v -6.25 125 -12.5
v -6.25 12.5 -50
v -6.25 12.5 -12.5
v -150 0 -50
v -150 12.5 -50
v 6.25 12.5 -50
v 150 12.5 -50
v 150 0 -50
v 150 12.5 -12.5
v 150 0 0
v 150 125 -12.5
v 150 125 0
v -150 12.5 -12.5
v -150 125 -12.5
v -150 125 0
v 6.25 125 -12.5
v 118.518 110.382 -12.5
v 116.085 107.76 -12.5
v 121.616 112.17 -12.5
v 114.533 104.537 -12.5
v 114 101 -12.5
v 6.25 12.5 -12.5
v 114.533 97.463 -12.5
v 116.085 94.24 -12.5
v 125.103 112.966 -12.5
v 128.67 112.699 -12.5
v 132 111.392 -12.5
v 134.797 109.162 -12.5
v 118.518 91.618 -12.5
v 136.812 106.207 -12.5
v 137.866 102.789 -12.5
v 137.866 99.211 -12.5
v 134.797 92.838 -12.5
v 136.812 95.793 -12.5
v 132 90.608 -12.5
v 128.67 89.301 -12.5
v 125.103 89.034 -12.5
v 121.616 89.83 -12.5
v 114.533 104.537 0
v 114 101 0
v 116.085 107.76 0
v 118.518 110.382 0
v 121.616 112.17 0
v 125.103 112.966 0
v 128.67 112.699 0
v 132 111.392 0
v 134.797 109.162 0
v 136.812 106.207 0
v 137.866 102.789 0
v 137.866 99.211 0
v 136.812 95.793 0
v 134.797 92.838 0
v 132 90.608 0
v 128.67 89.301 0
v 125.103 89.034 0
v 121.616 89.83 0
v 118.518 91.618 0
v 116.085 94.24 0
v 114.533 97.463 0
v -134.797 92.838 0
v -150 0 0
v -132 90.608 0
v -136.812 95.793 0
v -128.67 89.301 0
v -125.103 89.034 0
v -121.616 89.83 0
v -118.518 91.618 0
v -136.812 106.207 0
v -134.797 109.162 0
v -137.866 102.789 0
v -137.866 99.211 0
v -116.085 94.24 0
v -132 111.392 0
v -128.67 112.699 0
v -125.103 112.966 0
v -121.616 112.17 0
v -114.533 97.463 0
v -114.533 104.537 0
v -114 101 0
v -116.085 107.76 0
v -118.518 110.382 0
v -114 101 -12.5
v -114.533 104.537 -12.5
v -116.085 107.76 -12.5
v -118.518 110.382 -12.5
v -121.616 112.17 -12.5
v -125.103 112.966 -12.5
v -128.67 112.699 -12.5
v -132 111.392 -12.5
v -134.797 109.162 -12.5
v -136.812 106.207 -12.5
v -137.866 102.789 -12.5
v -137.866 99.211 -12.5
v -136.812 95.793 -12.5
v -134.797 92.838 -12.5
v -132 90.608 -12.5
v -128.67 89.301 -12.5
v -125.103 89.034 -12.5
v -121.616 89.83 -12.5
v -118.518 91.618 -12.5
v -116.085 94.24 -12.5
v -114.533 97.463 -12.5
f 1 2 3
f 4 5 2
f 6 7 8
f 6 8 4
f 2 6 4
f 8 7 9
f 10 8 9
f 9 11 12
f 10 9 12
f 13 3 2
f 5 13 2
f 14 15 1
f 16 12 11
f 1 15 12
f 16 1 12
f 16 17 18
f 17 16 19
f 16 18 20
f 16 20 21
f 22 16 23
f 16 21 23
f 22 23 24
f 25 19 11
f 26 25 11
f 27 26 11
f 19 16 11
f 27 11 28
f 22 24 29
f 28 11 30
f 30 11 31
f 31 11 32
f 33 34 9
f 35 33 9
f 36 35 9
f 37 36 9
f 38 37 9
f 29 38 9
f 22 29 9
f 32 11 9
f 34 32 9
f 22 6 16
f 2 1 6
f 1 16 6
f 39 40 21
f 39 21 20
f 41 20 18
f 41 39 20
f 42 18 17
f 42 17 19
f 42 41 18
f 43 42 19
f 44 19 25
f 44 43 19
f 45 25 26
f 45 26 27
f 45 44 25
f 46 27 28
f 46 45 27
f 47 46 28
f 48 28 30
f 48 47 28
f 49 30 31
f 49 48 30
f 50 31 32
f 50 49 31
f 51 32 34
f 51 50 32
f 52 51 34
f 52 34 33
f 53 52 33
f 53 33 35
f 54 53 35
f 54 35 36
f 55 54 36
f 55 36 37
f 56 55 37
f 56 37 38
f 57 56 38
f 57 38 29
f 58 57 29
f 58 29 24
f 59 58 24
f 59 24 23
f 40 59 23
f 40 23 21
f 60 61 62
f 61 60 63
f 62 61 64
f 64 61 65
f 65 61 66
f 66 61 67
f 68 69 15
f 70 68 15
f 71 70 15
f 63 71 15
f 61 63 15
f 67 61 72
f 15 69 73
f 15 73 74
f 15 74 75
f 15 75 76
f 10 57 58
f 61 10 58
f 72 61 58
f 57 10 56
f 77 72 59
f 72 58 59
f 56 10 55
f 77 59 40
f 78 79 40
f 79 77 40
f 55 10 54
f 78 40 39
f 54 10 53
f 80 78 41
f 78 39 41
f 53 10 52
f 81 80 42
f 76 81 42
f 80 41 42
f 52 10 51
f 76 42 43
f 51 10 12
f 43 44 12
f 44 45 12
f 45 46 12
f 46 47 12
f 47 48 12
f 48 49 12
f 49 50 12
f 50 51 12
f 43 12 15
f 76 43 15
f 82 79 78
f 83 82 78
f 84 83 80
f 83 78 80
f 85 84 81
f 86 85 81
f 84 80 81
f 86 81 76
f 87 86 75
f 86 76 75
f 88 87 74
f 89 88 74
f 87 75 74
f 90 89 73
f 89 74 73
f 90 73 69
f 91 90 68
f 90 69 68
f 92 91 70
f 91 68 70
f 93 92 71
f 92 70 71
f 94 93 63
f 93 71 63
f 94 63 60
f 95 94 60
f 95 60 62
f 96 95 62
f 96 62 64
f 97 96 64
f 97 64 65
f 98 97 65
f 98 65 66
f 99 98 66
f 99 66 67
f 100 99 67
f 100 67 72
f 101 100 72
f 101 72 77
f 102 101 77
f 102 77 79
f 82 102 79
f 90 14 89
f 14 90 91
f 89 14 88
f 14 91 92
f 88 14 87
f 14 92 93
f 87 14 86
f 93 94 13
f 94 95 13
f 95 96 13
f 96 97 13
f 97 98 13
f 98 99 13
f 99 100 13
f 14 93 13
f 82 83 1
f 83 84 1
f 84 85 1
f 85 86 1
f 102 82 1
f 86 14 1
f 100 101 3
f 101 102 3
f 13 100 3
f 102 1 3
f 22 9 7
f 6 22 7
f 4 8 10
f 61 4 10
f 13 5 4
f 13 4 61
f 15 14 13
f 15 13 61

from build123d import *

# Parameters (mm, degrees)
BOSS_EXTRUDE2_DEPTH = 0.15
BOSS_EXTRUDE3_DEPTH = 0.00625
CUT_EXTRUDE2_REACH  = 2.202
SKETCH7_R           = 0.012
SCALE1_SCALE        = 1000


with BuildPart() as part:
    # Sketch4 → Boss-Extrude2 (new, symmetric)
    with BuildSketch(Plane(origin=(0, 0, 0), x_dir=(0, 0, -1), z_dir=(1, 0, 0))):
        Polygon((0, 0), (0, 0.125), (0.0125, 0.125), (0.0125, 0.0125), (0.05, 0.0125), (0.05, 0), align=None)
    extrude(amount=BOSS_EXTRUDE2_DEPTH, both=True)

    # Sketch6 → Boss-Extrude3 (add, symmetric)
    with BuildSketch(Plane(origin=(0, 0, 0), x_dir=(0, 0, -1), z_dir=(1, 0, 0))):
        Polygon((0.0125, 0.0125), (0.0125, 0.125), (0.05, 0.0125), align=None)
    extrude(amount=BOSS_EXTRUDE3_DEPTH, both=True)

    # Sketch7 → Cut-Extrude2 (cut, up to next)
    with BuildSketch(Plane.XY, mode=Mode.PRIVATE) as cut_extrude2_sk1:
        with Locations((-0.126, 0.101)):
            Circle(SKETCH7_R)
    cut_extrude2_tool1 = extrude(cut_extrude2_sk1.sketch, amount=-CUT_EXTRUDE2_REACH, mode=Mode.PRIVATE) & part.part
    cut_extrude2 = cut_extrude2_tool1.solids().sort_by_distance((-0.126, 0.101, 0))[0]
    add(cut_extrude2, mode=Mode.SUBTRACT)

    # Mirror1: Cut-Extrude2 across plane
    add(cut_extrude2.mirror(Plane(origin=(0, 0, 0), x_dir=(0, 0, 1), z_dir=(1, 0, 0))), mode=Mode.SUBTRACT)


with BuildPart() as part_1:
    # Scale1: scaled about (0, 0, 0)
    add(part.part.scale(SCALE1_SCALE))


solid = part_1.part
